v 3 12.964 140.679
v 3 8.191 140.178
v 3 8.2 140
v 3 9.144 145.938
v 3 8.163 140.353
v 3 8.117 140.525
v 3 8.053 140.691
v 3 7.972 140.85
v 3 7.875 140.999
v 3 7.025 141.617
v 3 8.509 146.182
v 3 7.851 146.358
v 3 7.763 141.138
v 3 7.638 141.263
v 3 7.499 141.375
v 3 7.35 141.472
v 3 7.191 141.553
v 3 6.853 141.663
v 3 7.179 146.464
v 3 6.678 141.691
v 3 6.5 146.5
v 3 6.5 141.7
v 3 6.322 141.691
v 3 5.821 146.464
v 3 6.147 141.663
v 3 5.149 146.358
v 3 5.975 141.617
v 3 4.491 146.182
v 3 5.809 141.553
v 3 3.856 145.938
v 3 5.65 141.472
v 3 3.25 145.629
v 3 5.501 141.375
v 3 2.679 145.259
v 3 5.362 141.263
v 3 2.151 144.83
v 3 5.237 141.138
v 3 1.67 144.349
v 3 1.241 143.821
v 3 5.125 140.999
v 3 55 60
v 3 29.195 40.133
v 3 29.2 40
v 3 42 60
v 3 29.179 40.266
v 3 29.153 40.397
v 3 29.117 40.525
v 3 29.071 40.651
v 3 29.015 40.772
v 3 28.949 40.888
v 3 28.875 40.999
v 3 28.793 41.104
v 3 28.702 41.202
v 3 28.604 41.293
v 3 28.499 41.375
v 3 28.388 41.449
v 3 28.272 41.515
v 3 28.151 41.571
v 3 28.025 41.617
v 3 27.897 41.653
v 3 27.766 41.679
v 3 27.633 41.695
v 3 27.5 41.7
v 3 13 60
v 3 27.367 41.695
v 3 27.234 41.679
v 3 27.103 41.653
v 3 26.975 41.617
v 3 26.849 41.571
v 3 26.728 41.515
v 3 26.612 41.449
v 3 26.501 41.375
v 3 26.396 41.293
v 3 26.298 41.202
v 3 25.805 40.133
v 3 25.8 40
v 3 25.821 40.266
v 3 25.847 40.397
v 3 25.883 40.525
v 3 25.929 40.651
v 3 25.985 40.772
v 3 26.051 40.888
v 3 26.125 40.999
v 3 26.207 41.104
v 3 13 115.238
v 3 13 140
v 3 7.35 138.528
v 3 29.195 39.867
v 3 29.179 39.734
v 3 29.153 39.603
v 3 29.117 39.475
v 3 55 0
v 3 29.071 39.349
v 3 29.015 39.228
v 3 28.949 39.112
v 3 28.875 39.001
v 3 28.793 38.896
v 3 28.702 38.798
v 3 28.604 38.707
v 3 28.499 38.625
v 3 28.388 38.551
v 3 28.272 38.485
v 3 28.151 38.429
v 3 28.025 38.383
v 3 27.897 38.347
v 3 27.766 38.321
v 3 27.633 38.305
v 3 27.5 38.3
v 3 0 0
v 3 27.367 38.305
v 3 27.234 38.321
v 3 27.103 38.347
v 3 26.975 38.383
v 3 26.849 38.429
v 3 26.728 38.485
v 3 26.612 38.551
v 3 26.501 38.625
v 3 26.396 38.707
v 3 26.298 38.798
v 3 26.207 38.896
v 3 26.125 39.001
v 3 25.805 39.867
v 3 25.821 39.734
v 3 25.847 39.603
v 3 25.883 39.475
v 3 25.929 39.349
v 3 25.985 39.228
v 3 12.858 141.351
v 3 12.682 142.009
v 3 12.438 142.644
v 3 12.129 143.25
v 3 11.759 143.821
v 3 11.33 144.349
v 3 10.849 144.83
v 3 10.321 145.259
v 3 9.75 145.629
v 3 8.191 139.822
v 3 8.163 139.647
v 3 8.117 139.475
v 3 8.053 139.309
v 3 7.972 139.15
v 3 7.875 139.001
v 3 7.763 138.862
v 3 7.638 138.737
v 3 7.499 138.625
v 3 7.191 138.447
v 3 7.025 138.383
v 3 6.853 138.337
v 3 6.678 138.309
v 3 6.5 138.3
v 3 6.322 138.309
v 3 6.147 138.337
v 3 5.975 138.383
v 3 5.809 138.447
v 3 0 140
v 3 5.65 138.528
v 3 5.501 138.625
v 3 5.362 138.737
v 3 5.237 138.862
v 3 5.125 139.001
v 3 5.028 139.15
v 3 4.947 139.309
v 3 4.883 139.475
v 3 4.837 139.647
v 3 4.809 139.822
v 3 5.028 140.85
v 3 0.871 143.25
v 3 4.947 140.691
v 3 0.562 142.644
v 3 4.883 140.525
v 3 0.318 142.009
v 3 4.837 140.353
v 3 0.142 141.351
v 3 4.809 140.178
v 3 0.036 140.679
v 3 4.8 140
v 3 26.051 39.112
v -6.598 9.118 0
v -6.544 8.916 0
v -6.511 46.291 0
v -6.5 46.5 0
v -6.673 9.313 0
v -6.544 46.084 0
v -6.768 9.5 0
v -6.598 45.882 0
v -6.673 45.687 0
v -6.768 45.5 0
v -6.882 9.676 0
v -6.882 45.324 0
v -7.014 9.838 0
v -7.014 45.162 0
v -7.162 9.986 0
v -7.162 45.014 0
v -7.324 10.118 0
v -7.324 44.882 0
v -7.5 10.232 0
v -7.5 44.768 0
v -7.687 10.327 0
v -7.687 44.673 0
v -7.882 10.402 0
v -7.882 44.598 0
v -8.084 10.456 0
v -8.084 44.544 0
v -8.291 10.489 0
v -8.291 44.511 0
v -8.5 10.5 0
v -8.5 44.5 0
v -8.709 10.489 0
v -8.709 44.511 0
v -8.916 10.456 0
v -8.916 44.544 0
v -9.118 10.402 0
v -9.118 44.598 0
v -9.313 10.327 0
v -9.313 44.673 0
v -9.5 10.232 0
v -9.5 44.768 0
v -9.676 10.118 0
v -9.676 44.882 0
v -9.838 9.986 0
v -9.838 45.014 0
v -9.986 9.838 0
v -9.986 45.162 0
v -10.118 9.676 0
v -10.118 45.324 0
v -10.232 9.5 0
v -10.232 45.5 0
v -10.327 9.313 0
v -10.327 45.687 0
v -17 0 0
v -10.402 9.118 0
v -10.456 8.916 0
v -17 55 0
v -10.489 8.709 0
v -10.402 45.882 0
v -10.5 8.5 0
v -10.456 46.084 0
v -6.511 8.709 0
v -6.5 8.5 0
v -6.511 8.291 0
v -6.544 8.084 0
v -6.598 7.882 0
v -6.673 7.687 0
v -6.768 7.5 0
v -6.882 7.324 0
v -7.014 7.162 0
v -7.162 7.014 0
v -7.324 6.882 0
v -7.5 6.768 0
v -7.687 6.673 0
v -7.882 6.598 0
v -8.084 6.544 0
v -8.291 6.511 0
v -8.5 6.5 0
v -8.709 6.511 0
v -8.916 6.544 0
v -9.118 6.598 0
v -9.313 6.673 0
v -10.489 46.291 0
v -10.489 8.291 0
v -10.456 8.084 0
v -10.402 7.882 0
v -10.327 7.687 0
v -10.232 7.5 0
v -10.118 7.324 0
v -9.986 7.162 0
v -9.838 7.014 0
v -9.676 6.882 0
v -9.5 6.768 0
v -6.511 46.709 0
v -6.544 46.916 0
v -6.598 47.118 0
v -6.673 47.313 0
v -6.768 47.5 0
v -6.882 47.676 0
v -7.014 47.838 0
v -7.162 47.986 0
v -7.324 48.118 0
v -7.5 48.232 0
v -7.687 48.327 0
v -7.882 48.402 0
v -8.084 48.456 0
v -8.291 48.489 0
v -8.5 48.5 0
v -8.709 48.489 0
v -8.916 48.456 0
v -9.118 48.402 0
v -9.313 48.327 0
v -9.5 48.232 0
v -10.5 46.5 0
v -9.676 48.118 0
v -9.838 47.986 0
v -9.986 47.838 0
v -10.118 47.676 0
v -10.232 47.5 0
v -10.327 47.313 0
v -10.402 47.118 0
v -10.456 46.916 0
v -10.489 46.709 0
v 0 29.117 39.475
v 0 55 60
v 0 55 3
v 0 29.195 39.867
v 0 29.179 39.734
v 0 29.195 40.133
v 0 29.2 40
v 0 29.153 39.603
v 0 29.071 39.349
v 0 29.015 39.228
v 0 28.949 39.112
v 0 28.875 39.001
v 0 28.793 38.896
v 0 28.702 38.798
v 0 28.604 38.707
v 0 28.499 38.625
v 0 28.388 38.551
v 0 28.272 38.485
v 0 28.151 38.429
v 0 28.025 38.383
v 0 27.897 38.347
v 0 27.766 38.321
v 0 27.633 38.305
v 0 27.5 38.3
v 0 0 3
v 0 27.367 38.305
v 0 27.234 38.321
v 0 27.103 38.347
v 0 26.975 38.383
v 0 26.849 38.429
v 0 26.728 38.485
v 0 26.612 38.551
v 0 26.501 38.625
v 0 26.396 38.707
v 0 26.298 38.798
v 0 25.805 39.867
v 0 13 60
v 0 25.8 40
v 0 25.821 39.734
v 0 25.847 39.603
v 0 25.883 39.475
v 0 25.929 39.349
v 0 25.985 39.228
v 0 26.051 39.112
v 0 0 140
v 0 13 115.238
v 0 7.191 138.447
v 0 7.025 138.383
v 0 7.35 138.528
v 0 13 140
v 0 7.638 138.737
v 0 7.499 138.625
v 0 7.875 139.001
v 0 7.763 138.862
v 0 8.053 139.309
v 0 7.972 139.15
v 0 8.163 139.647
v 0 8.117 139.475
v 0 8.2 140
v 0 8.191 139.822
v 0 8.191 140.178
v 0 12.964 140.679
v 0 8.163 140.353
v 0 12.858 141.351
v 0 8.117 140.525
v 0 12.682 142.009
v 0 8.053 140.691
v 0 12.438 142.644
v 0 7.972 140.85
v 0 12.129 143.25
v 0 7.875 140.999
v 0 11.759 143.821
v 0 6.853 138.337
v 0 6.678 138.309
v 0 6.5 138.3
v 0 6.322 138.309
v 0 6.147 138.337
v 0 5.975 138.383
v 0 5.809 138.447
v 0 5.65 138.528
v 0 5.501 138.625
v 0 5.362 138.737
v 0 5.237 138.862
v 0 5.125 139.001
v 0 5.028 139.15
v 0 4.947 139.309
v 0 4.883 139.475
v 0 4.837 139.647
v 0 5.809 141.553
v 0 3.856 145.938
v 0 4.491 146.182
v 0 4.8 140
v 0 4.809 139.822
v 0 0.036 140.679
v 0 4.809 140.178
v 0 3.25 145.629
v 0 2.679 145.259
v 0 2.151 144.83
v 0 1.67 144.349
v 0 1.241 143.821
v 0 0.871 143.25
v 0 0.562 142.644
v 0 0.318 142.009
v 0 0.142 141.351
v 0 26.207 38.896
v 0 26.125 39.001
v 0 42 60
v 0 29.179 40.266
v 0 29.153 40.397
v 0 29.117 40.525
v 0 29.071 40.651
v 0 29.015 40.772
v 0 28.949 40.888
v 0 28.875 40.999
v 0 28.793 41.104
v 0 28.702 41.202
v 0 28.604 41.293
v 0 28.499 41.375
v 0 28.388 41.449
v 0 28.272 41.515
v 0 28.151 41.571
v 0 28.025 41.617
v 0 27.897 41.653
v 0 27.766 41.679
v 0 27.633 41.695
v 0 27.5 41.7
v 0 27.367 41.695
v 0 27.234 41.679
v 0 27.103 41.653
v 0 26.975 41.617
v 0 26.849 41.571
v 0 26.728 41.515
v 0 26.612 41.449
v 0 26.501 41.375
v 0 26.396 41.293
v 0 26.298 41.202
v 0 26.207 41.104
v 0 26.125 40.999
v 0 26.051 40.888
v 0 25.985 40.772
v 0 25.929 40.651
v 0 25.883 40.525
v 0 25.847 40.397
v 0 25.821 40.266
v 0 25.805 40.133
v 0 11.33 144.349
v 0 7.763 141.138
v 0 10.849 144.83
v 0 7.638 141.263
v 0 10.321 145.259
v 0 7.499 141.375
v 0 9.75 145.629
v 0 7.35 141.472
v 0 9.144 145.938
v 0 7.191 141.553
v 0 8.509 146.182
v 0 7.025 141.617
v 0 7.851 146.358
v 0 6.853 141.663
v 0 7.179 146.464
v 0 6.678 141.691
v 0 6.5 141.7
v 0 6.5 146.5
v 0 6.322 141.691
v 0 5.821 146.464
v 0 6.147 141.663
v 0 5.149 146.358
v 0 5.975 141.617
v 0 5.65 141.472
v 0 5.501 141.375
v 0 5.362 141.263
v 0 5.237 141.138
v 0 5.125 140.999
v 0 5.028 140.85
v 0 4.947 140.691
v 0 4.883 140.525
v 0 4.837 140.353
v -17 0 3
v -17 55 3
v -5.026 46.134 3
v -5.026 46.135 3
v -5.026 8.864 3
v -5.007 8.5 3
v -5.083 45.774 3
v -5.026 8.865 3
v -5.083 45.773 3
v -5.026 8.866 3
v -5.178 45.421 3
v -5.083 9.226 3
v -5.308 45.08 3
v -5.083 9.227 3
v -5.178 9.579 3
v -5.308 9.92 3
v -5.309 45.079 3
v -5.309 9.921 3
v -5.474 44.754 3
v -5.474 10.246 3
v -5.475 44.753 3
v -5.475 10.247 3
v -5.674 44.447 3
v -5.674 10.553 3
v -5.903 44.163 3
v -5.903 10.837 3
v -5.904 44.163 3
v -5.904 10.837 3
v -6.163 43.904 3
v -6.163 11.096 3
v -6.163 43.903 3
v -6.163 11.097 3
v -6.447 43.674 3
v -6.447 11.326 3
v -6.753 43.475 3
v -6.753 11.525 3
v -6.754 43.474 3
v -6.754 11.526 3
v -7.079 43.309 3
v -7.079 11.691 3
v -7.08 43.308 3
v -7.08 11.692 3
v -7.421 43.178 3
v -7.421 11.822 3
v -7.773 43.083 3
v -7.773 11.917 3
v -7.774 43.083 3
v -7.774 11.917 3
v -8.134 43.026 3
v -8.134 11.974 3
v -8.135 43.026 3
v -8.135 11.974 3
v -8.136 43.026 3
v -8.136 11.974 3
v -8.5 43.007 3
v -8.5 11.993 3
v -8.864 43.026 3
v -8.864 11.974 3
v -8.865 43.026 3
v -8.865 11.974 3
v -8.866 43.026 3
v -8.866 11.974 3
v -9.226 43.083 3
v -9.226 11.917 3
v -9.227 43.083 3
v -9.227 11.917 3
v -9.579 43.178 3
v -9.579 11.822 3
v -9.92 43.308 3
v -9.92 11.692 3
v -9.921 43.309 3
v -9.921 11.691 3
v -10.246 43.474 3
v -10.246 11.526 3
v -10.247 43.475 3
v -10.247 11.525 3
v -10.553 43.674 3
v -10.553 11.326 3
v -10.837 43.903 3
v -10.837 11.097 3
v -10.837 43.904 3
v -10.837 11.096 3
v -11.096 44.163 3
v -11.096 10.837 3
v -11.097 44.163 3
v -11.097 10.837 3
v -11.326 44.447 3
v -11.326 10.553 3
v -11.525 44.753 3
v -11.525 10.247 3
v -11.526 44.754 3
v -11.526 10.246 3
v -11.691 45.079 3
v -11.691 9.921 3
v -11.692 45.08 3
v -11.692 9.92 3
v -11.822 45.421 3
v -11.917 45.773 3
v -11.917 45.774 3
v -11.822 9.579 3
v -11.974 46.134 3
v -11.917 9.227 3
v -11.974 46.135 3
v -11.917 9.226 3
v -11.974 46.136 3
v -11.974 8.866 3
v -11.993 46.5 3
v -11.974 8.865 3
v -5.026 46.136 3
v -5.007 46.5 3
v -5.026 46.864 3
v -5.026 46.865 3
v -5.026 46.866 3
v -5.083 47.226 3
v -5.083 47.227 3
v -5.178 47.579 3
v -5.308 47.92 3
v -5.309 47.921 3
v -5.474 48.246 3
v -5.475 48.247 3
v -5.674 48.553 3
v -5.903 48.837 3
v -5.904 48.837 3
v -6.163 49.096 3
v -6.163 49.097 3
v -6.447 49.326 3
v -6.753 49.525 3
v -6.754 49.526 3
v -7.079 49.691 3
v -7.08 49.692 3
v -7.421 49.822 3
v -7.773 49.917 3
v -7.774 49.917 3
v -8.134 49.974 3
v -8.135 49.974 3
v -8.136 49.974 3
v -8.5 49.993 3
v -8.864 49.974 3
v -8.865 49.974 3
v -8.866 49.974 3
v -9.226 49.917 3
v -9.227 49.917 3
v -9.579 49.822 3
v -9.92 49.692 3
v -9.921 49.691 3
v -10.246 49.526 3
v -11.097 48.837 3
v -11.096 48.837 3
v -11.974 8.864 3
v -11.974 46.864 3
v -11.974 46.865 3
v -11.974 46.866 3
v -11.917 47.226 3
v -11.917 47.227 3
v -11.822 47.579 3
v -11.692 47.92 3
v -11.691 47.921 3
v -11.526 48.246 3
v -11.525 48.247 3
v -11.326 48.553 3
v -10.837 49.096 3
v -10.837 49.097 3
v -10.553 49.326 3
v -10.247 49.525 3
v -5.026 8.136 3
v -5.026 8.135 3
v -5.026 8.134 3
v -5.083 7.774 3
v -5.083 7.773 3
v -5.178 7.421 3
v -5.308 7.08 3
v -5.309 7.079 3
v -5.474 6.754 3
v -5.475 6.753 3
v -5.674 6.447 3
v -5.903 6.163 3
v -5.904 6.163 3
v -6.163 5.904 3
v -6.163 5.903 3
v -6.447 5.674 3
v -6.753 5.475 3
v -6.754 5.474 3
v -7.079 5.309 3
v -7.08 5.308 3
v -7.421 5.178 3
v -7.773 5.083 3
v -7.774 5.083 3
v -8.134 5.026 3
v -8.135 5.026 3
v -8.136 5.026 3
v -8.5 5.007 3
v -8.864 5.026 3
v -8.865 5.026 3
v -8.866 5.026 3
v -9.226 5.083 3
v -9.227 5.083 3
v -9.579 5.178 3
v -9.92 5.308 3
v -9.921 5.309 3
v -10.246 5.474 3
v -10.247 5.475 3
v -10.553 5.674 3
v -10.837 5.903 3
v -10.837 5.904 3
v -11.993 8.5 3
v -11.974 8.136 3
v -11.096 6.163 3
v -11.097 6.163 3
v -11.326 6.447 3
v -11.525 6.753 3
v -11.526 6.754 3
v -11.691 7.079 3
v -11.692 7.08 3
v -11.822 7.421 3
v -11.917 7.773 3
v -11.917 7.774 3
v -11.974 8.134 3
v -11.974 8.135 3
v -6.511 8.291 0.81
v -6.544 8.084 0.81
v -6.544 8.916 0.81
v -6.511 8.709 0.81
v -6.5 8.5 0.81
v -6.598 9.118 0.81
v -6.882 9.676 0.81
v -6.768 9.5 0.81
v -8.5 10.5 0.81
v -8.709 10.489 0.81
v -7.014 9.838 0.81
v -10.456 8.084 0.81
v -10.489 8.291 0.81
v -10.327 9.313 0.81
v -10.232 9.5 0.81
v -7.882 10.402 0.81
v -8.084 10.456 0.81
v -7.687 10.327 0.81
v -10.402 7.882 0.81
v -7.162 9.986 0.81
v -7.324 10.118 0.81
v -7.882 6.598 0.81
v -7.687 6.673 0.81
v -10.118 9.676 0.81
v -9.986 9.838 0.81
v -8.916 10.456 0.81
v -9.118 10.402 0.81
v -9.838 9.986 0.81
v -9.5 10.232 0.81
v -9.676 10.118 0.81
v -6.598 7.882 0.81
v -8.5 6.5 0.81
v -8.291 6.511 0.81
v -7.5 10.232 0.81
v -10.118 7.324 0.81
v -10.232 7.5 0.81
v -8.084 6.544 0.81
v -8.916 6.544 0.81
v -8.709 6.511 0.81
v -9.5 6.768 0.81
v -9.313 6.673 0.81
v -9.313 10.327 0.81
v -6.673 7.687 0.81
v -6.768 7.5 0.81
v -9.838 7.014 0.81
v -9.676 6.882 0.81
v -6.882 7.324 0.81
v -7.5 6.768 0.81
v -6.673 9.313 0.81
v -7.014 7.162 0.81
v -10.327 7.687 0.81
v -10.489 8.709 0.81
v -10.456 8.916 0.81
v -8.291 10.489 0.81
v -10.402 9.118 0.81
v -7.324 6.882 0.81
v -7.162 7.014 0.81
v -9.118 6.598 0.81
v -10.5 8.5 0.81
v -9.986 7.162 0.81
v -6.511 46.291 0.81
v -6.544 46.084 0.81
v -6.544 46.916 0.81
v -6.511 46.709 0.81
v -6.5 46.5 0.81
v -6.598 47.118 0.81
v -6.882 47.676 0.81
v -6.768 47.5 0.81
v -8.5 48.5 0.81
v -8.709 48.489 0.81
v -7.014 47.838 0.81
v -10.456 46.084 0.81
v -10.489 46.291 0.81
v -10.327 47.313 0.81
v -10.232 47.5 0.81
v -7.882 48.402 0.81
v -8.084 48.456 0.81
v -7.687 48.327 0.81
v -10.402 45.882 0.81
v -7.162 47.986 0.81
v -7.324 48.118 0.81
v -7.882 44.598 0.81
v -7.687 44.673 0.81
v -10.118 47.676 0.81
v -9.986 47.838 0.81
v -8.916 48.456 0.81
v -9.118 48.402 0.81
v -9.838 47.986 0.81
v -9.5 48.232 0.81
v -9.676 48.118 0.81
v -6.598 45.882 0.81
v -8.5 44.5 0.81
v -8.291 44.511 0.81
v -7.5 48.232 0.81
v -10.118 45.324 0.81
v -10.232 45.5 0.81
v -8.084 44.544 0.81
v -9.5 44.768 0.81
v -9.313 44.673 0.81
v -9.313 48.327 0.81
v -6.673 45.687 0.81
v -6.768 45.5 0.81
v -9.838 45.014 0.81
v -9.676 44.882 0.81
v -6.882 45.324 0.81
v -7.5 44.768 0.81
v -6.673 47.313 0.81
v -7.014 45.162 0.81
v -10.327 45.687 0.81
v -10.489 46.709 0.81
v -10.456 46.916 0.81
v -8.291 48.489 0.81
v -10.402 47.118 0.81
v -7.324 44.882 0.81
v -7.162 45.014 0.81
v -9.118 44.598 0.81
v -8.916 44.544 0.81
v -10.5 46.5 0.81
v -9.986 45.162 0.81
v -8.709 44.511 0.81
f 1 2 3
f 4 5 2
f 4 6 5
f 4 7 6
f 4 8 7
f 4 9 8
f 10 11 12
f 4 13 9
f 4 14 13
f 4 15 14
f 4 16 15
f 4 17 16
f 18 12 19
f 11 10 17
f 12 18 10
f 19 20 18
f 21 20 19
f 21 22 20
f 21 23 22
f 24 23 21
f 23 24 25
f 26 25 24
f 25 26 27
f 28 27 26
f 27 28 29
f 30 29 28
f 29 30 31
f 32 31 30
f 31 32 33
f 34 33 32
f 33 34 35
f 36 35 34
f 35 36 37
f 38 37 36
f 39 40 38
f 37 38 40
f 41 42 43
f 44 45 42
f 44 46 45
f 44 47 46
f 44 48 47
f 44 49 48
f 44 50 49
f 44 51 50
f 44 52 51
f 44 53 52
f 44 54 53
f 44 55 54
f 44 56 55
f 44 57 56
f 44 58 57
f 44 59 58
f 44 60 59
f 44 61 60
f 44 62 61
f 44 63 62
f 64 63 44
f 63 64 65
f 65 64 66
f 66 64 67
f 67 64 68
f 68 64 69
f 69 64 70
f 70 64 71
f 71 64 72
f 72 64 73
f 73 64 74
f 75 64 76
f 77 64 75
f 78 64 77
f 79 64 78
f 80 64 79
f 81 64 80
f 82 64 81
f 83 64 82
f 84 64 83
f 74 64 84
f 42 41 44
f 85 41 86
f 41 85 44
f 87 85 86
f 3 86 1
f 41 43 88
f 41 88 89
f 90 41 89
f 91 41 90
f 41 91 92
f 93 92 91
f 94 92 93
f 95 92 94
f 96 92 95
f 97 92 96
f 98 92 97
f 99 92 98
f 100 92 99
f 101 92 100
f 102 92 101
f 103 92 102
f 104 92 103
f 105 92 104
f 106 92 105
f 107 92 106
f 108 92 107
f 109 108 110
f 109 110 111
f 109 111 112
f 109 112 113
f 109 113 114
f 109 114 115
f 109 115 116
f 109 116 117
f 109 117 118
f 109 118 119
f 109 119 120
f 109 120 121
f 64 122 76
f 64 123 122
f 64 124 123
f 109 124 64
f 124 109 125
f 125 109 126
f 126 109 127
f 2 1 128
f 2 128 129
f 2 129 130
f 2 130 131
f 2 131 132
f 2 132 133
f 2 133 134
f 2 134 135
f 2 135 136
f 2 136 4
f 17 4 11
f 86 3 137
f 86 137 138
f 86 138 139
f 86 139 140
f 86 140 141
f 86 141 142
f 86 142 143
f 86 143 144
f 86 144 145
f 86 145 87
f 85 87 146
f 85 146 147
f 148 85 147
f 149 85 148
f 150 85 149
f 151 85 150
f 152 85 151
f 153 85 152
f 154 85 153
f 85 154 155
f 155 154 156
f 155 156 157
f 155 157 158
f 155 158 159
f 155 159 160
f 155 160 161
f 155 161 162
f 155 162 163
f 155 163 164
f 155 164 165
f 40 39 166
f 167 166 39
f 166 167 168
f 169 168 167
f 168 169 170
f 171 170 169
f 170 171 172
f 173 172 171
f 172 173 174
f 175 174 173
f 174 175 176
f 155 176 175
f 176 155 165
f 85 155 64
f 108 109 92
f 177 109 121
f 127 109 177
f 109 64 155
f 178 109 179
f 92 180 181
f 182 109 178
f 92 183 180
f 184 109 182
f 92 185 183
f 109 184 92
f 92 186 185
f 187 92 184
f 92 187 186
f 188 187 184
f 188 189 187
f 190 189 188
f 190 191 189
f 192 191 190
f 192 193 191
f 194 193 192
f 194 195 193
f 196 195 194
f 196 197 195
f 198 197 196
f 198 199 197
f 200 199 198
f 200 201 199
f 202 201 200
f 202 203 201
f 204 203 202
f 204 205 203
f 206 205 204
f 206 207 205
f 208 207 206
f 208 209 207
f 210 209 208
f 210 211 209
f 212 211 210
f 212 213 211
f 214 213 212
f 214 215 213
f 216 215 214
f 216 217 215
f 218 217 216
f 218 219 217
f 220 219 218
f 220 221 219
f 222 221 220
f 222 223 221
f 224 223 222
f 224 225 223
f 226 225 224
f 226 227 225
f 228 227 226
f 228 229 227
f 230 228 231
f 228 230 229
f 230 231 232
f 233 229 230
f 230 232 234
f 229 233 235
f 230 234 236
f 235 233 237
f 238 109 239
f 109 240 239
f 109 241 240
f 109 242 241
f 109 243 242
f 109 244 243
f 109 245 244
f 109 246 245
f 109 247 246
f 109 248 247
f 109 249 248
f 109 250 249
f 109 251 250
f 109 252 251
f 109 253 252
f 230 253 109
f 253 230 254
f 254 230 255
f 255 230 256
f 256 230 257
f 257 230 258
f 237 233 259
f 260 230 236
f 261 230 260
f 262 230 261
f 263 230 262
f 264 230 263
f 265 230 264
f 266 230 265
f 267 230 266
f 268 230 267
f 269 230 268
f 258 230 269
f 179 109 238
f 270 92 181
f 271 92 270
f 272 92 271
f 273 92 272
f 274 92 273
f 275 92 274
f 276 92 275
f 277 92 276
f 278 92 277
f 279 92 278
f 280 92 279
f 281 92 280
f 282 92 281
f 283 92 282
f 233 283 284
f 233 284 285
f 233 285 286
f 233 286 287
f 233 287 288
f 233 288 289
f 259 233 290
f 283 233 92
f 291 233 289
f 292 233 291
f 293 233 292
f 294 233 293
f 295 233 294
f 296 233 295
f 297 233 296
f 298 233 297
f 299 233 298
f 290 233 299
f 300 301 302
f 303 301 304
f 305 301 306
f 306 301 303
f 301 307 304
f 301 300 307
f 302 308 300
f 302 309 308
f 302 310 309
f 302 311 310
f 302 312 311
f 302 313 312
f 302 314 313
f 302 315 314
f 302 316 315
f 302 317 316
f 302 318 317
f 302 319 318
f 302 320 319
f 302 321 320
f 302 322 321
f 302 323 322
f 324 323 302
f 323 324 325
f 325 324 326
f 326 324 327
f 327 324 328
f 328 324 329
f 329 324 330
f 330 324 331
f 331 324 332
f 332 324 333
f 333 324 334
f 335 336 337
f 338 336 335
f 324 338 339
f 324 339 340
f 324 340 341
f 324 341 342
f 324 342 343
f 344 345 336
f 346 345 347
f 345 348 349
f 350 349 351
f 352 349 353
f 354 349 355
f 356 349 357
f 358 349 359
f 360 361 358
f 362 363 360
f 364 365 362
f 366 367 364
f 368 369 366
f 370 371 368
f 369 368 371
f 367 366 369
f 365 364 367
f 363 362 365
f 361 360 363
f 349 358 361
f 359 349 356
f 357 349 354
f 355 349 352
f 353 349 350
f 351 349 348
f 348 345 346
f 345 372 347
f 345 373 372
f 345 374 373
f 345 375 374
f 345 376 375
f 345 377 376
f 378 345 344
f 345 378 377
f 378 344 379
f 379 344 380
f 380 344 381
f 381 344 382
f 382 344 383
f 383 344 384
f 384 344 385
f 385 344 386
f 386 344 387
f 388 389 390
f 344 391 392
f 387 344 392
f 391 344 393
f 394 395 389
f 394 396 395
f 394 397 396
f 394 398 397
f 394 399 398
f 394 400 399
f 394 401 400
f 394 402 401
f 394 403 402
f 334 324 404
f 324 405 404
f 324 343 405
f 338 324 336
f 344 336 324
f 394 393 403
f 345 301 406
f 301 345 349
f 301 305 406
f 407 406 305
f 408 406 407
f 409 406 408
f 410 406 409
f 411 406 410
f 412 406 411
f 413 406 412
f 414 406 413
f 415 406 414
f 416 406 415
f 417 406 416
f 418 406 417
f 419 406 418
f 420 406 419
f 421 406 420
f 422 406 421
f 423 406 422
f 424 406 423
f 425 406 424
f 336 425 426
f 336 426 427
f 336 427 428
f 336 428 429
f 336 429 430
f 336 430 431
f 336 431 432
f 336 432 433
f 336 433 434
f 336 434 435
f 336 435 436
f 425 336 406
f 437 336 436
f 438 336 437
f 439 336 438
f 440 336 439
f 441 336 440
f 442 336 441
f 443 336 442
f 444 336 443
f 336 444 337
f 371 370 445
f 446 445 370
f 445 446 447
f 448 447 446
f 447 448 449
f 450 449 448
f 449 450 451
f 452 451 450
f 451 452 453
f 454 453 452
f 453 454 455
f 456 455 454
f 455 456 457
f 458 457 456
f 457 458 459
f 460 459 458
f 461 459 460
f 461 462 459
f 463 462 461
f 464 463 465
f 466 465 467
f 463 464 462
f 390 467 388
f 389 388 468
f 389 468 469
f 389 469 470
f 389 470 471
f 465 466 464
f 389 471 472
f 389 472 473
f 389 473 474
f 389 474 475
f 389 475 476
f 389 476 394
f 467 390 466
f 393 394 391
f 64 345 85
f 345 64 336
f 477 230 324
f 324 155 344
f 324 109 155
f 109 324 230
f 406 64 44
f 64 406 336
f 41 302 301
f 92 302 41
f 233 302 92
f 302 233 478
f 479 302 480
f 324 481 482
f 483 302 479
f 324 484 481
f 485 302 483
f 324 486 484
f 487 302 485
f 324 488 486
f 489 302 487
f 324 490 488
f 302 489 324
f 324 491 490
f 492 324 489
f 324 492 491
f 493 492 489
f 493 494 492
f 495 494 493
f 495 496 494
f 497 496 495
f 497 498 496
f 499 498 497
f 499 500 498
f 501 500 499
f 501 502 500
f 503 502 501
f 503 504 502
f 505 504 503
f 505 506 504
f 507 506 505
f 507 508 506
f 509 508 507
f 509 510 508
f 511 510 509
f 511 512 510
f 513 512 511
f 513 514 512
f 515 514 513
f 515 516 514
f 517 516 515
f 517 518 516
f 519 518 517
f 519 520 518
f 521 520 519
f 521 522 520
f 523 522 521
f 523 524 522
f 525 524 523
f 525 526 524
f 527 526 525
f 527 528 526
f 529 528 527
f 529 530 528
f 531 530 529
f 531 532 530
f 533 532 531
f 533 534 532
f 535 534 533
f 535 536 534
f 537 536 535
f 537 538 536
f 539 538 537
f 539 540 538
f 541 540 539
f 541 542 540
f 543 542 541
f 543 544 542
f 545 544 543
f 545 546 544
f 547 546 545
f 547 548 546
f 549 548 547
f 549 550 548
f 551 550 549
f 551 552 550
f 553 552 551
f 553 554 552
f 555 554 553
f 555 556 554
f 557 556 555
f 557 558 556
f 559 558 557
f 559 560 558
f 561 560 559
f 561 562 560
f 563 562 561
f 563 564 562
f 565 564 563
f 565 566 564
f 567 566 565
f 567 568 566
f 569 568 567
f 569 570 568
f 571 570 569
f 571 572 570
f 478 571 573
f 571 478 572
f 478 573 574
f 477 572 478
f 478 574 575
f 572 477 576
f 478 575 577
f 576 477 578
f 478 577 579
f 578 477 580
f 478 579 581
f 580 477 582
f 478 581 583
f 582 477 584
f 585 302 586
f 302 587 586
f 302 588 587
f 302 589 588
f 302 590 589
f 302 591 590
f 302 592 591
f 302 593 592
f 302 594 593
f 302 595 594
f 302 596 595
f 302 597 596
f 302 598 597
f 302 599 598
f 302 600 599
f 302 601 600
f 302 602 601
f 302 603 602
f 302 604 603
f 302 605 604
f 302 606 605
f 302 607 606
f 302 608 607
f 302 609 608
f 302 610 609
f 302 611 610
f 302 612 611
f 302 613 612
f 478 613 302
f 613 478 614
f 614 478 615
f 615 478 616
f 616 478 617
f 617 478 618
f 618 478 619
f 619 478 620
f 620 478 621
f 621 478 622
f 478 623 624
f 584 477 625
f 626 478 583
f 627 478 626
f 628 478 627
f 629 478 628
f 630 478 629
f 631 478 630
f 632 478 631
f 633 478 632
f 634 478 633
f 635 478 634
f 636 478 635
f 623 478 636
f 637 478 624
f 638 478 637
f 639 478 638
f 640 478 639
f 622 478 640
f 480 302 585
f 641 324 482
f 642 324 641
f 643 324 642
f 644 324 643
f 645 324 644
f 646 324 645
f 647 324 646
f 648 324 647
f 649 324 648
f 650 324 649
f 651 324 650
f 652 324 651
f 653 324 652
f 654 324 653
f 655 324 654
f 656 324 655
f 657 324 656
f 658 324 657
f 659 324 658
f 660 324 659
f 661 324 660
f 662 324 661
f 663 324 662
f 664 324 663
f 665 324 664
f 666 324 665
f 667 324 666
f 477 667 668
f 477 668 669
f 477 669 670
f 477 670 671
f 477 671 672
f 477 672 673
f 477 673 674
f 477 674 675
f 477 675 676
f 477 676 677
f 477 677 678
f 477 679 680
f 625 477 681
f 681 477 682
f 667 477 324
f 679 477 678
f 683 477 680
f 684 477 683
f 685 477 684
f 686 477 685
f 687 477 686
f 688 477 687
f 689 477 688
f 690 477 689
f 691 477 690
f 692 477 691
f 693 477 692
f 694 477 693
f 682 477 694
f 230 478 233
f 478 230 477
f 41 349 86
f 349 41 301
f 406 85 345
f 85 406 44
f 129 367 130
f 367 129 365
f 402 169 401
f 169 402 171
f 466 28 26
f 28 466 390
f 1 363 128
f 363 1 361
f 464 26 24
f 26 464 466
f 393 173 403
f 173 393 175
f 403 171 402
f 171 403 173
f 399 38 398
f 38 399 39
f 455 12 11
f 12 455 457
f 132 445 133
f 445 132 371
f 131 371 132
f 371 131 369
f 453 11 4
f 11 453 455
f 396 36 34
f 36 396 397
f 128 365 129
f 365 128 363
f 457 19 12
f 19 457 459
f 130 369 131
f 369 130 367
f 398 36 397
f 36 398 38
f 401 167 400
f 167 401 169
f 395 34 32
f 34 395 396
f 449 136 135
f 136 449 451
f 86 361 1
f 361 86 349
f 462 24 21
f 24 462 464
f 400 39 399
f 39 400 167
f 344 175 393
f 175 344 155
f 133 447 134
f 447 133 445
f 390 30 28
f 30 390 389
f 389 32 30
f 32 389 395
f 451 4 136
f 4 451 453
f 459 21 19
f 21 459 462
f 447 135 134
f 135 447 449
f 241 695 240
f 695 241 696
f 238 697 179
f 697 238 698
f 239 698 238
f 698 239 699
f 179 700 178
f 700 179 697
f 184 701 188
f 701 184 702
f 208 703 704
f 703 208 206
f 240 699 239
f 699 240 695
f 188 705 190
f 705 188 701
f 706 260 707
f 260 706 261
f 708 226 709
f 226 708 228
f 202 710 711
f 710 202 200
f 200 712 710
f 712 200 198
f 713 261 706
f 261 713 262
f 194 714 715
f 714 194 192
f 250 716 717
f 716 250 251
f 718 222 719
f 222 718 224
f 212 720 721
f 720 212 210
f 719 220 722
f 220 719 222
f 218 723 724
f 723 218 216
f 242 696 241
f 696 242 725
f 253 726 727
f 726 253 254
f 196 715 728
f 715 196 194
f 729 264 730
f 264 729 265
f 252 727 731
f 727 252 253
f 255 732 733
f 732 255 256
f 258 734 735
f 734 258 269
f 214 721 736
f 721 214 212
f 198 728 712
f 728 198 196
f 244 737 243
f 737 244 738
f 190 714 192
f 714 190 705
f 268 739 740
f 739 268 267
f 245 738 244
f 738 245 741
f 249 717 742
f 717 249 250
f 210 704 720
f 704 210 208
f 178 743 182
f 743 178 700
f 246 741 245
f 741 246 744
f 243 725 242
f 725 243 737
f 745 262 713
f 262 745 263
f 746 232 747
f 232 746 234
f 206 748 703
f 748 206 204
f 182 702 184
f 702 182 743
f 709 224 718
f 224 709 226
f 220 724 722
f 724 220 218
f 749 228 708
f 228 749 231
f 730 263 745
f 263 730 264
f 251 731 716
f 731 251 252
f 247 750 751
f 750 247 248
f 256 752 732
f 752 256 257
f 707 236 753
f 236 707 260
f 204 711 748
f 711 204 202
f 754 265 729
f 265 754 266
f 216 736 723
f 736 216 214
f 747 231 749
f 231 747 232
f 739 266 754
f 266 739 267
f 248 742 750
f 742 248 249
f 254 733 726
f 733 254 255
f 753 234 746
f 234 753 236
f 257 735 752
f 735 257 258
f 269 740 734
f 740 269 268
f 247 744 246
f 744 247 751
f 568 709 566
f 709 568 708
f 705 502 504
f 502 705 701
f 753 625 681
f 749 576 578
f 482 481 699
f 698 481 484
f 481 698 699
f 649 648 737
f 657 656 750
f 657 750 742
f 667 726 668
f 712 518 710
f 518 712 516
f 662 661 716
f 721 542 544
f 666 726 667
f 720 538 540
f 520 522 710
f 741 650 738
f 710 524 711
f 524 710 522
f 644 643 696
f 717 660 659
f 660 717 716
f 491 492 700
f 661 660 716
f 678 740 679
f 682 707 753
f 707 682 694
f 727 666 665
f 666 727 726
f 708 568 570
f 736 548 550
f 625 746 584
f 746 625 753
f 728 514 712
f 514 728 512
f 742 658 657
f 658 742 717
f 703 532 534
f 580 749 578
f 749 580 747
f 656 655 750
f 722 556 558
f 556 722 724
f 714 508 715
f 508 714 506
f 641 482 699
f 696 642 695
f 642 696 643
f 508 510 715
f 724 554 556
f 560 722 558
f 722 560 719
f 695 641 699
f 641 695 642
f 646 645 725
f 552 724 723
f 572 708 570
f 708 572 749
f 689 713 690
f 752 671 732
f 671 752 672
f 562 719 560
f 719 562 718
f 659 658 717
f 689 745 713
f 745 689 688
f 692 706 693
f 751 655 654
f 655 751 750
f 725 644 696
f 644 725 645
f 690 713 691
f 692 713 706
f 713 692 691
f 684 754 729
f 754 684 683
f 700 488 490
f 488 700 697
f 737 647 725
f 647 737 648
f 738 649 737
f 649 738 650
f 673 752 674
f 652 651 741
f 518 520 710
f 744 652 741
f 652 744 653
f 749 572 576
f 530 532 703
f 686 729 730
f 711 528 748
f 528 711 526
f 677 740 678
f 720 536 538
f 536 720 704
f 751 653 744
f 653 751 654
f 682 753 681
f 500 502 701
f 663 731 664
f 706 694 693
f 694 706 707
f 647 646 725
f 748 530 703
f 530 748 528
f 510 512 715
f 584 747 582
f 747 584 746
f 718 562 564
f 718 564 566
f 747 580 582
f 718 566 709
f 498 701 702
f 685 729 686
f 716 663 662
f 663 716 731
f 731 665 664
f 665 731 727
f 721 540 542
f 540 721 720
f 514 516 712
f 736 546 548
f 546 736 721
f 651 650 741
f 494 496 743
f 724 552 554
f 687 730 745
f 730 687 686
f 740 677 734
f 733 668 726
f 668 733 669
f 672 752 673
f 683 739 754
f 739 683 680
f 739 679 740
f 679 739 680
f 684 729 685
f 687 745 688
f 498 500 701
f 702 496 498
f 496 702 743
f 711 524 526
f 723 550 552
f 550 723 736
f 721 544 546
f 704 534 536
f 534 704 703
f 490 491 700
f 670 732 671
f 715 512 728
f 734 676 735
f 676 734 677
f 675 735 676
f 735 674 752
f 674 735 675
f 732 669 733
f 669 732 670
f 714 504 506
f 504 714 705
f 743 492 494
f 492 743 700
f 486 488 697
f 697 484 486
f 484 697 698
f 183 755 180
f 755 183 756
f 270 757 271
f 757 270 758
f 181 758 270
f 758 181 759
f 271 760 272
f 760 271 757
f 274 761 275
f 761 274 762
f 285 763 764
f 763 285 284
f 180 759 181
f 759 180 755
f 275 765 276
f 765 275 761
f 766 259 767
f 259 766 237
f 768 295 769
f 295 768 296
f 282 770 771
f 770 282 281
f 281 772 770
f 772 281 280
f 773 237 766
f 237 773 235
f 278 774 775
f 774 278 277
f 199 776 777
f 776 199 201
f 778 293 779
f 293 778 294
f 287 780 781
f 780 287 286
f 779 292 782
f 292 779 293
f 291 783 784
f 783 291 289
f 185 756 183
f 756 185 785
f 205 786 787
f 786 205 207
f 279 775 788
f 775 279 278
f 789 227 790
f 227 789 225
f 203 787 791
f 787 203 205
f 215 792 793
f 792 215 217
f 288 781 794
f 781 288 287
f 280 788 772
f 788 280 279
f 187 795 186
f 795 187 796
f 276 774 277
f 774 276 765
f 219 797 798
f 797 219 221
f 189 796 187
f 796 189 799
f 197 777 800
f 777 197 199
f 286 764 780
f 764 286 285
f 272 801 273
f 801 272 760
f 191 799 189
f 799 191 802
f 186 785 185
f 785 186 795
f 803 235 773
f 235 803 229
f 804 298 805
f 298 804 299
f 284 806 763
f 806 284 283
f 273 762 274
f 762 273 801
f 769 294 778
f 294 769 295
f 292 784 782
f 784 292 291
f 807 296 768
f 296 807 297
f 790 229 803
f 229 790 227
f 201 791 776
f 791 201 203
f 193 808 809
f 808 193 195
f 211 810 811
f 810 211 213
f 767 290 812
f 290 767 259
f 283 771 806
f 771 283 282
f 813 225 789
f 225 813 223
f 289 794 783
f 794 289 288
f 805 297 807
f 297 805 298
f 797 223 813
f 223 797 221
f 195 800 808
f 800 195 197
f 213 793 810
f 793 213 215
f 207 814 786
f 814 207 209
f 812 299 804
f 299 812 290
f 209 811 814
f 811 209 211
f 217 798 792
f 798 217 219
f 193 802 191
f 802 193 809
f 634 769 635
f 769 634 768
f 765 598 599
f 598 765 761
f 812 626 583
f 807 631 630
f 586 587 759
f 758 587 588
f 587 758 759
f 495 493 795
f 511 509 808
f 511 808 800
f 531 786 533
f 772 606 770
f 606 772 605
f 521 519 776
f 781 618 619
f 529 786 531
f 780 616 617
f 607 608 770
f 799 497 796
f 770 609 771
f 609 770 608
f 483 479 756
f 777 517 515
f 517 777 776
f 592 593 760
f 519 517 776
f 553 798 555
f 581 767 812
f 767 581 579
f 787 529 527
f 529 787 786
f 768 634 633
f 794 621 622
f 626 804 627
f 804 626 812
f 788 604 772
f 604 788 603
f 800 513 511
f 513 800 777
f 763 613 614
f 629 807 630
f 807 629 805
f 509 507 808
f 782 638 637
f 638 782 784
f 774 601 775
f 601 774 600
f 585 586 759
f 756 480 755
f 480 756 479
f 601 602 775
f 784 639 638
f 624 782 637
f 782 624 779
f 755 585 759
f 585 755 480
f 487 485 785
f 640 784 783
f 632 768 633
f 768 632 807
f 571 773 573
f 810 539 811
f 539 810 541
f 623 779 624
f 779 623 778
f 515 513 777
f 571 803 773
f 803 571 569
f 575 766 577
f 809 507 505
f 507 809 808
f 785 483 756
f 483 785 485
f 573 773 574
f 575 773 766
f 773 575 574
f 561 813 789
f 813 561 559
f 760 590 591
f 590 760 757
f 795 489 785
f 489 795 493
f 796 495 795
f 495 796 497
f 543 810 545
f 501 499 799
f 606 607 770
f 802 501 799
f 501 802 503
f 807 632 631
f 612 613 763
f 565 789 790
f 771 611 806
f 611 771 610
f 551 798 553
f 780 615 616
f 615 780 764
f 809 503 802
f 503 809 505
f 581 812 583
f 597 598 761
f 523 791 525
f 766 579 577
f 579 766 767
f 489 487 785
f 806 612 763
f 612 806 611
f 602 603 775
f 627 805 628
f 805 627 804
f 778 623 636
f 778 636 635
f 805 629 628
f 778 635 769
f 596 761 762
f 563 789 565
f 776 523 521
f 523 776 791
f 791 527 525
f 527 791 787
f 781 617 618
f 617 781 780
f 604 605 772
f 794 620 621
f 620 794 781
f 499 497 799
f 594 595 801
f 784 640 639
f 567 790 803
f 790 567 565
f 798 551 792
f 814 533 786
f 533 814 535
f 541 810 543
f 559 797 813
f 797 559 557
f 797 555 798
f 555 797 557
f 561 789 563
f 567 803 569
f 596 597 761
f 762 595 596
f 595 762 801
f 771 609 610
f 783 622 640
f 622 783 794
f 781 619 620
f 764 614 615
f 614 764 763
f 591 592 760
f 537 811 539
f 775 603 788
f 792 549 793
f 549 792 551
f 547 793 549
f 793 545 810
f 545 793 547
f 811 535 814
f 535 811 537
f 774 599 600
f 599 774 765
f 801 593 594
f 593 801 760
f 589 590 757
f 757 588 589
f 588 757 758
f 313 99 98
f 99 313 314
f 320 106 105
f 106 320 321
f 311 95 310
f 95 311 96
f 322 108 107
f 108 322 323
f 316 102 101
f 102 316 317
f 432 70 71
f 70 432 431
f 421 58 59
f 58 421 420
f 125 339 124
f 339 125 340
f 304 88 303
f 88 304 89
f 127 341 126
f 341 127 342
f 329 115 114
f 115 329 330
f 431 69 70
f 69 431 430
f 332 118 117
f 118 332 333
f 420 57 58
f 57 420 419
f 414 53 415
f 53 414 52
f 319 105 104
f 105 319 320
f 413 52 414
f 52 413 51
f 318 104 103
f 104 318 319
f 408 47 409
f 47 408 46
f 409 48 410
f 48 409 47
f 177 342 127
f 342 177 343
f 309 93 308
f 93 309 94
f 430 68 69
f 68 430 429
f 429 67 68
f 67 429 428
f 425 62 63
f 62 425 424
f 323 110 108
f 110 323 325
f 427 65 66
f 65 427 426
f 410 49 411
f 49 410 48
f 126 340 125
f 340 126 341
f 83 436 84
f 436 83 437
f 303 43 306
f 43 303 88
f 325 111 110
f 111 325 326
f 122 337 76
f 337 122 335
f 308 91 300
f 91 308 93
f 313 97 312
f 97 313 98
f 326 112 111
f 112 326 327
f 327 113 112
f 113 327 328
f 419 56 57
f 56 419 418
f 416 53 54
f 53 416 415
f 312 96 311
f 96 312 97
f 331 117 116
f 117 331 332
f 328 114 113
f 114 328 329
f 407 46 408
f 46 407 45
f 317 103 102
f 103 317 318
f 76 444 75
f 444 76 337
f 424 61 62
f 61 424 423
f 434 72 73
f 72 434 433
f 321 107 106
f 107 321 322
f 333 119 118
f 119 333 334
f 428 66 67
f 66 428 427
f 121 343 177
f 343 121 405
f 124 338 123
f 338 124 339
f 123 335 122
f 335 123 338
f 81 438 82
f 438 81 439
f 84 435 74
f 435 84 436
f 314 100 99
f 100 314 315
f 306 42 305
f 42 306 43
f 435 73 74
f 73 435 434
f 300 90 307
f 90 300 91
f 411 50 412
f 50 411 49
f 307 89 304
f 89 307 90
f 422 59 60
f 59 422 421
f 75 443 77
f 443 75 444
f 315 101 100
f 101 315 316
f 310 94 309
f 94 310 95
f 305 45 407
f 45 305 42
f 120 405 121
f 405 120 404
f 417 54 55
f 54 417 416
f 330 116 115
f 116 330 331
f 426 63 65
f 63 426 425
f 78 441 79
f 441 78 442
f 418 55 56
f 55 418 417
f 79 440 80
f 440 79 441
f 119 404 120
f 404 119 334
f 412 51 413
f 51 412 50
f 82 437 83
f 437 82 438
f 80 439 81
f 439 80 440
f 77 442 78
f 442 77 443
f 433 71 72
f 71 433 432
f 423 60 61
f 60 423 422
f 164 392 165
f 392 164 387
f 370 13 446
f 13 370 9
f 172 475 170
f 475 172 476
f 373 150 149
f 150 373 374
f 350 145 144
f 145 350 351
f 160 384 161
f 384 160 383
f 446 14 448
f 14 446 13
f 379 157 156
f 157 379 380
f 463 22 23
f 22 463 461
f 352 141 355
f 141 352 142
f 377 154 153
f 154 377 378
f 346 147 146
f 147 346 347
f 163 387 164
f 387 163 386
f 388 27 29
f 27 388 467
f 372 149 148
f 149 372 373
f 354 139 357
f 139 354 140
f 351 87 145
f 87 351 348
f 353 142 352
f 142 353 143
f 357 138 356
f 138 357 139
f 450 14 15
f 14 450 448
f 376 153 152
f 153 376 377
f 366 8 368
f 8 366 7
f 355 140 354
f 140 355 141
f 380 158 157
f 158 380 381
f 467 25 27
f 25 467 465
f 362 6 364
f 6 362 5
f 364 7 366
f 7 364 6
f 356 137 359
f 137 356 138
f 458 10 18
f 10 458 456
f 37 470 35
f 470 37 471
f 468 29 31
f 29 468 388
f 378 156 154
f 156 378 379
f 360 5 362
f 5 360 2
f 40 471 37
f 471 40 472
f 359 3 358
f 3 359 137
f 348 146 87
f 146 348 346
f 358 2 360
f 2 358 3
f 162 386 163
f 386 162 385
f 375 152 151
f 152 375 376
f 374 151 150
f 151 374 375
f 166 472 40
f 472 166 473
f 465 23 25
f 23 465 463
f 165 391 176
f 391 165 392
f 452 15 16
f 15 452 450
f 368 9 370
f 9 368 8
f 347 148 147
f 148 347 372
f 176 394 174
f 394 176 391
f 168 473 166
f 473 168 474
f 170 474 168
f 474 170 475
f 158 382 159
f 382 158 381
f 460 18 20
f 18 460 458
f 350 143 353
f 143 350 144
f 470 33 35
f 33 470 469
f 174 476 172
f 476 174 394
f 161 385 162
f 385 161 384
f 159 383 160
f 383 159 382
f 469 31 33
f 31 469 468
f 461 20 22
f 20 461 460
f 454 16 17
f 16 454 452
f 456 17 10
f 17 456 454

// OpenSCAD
/**
 * Support
 * Model parameters
 */

SupportMotor2();

module SupportMotor2() {

    support_height = 140;
    support_width = 55;
    support_motor_support_height = 60;
    support_thickness = 3;
    bars_width = 13;
    horizontal_support_width = 20;
    support_throw_diameter = 3.4;
    horizontal_support_throw_diameter = 4;

    difference() {
        support(support_height, support_width, support_motor_support_height, support_thickness, bars_width, horizontal_support_width, fn=60);
        translate([0,45,32])
        byj_axis_throw();

        support_throws(support_height, support_throw_diameter);
        support_horizontal_throws(horizontal_support_width, horizontal_support_throw_diameter);
    }

    // has diff with support-motor-1.scad
    module support(support_height = 140, support_width = 54, support_motor_support_height = 60, support_thickness = 3, bars_width = 13, horizontal_support_width = 30, fn = 20) {

        union() {
            translate([0,0,0])
            cube([support_thickness, bars_width, support_height]);

            translate([0,0,0])
            cube([support_thickness, support_width, support_motor_support_height]);

            translate([-horizontal_support_width + support_thickness,0,0])
            cube([horizontal_support_width, support_width, support_thickness]);

            translate([0, 0, support_height])
            rotate([0,90,0])
            linear_extrude(height = support_thickness, center = false, convexity = 10, twist = 0)
            polygon([
                [0, 0],
                [0, bars_width],
                [support_height - support_motor_support_height, support_width],
                [support_height - support_motor_support_height, support_width - bars_width]
            ]);

            translate([0, bars_width / 2, support_height])
            rotate([0,90,0])
            cylinder(h=support_thickness, d=bars_width, center=false, $fn=fn);

        }

    }


    module support_throws(support_height = 140, support_throw_diameter = 3, fn = 60) {
        translate([0, bars_width / 2, support_height])
        rotate([0,90,0])
        cylinder(h=10, d=support_throw_diameter, center=true, $fn=fn);
    }


    // has diff with support-motor-1.scad
    module support_horizontal_throws(horizontal_support_width = 20, horizontal_support_throw_diameter = 4, support_thickness = 3, horizontal_support_thickness = 3, fn = 60) {

        epsilon = 0.01;
        horizontal_support_throw_radius = horizontal_support_throw_diameter / 2;

        cone_throw_heigh = horizontal_support_throw_radius * 1.1;
        cone_throw_r2 = horizontal_support_throw_radius * 1.75;

        union(){
            translate([ - ((horizontal_support_width - support_thickness) / 2) ,  (horizontal_support_width - support_thickness) / 2, 0]) {
                cylinder(h=10, d=horizontal_support_throw_diameter, center=true, $fn=fn);

                // cylinder(h = 2.2, r1 = 2, r2 = 3.5, center = true, $fn=fn); // Example
                translate([0,0, horizontal_support_thickness - cone_throw_heigh + epsilon])
                cylinder(h = cone_throw_heigh, r1 = horizontal_support_throw_radius, r2 = cone_throw_r2, center = false, $fn=fn);
            }

            translate([ -((horizontal_support_width - support_thickness) / 2), support_width - ((horizontal_support_width - support_thickness) / 2), 0]){
                cylinder(h=10, d=horizontal_support_throw_diameter, center=true, $fn=fn);

                translate([0,0, horizontal_support_thickness - cone_throw_heigh + epsilon])
                cylinder(h = cone_throw_heigh, r1 = horizontal_support_throw_radius, r2 = cone_throw_r2, center = false, $fn=fn);
            }
        }
    }


    module byj_motor_throws(fn = 80) {
        union() {
            translate([0,-17.5,8])
            rotate([0,90,0])
            cylinder(h=20, d=14, center=true, $fn=fn);

            translate([0,0,0])
            rotate([0,90,0])
            cylinder(h=20, d=3.4, center=true, $fn=fn);

            translate([0,-35,0])
            rotate([0,90,0])
            cylinder(h=20, d=3.4, center=true, $fn=fn);
        }
    }


    module byj_axis_throw(d=3.4, fn = 80) {
        translate([0,-17.5,8])
        rotate([0,90,0])
        cylinder(h=20, d=d, center=true, $fn=fn);
    }
}
